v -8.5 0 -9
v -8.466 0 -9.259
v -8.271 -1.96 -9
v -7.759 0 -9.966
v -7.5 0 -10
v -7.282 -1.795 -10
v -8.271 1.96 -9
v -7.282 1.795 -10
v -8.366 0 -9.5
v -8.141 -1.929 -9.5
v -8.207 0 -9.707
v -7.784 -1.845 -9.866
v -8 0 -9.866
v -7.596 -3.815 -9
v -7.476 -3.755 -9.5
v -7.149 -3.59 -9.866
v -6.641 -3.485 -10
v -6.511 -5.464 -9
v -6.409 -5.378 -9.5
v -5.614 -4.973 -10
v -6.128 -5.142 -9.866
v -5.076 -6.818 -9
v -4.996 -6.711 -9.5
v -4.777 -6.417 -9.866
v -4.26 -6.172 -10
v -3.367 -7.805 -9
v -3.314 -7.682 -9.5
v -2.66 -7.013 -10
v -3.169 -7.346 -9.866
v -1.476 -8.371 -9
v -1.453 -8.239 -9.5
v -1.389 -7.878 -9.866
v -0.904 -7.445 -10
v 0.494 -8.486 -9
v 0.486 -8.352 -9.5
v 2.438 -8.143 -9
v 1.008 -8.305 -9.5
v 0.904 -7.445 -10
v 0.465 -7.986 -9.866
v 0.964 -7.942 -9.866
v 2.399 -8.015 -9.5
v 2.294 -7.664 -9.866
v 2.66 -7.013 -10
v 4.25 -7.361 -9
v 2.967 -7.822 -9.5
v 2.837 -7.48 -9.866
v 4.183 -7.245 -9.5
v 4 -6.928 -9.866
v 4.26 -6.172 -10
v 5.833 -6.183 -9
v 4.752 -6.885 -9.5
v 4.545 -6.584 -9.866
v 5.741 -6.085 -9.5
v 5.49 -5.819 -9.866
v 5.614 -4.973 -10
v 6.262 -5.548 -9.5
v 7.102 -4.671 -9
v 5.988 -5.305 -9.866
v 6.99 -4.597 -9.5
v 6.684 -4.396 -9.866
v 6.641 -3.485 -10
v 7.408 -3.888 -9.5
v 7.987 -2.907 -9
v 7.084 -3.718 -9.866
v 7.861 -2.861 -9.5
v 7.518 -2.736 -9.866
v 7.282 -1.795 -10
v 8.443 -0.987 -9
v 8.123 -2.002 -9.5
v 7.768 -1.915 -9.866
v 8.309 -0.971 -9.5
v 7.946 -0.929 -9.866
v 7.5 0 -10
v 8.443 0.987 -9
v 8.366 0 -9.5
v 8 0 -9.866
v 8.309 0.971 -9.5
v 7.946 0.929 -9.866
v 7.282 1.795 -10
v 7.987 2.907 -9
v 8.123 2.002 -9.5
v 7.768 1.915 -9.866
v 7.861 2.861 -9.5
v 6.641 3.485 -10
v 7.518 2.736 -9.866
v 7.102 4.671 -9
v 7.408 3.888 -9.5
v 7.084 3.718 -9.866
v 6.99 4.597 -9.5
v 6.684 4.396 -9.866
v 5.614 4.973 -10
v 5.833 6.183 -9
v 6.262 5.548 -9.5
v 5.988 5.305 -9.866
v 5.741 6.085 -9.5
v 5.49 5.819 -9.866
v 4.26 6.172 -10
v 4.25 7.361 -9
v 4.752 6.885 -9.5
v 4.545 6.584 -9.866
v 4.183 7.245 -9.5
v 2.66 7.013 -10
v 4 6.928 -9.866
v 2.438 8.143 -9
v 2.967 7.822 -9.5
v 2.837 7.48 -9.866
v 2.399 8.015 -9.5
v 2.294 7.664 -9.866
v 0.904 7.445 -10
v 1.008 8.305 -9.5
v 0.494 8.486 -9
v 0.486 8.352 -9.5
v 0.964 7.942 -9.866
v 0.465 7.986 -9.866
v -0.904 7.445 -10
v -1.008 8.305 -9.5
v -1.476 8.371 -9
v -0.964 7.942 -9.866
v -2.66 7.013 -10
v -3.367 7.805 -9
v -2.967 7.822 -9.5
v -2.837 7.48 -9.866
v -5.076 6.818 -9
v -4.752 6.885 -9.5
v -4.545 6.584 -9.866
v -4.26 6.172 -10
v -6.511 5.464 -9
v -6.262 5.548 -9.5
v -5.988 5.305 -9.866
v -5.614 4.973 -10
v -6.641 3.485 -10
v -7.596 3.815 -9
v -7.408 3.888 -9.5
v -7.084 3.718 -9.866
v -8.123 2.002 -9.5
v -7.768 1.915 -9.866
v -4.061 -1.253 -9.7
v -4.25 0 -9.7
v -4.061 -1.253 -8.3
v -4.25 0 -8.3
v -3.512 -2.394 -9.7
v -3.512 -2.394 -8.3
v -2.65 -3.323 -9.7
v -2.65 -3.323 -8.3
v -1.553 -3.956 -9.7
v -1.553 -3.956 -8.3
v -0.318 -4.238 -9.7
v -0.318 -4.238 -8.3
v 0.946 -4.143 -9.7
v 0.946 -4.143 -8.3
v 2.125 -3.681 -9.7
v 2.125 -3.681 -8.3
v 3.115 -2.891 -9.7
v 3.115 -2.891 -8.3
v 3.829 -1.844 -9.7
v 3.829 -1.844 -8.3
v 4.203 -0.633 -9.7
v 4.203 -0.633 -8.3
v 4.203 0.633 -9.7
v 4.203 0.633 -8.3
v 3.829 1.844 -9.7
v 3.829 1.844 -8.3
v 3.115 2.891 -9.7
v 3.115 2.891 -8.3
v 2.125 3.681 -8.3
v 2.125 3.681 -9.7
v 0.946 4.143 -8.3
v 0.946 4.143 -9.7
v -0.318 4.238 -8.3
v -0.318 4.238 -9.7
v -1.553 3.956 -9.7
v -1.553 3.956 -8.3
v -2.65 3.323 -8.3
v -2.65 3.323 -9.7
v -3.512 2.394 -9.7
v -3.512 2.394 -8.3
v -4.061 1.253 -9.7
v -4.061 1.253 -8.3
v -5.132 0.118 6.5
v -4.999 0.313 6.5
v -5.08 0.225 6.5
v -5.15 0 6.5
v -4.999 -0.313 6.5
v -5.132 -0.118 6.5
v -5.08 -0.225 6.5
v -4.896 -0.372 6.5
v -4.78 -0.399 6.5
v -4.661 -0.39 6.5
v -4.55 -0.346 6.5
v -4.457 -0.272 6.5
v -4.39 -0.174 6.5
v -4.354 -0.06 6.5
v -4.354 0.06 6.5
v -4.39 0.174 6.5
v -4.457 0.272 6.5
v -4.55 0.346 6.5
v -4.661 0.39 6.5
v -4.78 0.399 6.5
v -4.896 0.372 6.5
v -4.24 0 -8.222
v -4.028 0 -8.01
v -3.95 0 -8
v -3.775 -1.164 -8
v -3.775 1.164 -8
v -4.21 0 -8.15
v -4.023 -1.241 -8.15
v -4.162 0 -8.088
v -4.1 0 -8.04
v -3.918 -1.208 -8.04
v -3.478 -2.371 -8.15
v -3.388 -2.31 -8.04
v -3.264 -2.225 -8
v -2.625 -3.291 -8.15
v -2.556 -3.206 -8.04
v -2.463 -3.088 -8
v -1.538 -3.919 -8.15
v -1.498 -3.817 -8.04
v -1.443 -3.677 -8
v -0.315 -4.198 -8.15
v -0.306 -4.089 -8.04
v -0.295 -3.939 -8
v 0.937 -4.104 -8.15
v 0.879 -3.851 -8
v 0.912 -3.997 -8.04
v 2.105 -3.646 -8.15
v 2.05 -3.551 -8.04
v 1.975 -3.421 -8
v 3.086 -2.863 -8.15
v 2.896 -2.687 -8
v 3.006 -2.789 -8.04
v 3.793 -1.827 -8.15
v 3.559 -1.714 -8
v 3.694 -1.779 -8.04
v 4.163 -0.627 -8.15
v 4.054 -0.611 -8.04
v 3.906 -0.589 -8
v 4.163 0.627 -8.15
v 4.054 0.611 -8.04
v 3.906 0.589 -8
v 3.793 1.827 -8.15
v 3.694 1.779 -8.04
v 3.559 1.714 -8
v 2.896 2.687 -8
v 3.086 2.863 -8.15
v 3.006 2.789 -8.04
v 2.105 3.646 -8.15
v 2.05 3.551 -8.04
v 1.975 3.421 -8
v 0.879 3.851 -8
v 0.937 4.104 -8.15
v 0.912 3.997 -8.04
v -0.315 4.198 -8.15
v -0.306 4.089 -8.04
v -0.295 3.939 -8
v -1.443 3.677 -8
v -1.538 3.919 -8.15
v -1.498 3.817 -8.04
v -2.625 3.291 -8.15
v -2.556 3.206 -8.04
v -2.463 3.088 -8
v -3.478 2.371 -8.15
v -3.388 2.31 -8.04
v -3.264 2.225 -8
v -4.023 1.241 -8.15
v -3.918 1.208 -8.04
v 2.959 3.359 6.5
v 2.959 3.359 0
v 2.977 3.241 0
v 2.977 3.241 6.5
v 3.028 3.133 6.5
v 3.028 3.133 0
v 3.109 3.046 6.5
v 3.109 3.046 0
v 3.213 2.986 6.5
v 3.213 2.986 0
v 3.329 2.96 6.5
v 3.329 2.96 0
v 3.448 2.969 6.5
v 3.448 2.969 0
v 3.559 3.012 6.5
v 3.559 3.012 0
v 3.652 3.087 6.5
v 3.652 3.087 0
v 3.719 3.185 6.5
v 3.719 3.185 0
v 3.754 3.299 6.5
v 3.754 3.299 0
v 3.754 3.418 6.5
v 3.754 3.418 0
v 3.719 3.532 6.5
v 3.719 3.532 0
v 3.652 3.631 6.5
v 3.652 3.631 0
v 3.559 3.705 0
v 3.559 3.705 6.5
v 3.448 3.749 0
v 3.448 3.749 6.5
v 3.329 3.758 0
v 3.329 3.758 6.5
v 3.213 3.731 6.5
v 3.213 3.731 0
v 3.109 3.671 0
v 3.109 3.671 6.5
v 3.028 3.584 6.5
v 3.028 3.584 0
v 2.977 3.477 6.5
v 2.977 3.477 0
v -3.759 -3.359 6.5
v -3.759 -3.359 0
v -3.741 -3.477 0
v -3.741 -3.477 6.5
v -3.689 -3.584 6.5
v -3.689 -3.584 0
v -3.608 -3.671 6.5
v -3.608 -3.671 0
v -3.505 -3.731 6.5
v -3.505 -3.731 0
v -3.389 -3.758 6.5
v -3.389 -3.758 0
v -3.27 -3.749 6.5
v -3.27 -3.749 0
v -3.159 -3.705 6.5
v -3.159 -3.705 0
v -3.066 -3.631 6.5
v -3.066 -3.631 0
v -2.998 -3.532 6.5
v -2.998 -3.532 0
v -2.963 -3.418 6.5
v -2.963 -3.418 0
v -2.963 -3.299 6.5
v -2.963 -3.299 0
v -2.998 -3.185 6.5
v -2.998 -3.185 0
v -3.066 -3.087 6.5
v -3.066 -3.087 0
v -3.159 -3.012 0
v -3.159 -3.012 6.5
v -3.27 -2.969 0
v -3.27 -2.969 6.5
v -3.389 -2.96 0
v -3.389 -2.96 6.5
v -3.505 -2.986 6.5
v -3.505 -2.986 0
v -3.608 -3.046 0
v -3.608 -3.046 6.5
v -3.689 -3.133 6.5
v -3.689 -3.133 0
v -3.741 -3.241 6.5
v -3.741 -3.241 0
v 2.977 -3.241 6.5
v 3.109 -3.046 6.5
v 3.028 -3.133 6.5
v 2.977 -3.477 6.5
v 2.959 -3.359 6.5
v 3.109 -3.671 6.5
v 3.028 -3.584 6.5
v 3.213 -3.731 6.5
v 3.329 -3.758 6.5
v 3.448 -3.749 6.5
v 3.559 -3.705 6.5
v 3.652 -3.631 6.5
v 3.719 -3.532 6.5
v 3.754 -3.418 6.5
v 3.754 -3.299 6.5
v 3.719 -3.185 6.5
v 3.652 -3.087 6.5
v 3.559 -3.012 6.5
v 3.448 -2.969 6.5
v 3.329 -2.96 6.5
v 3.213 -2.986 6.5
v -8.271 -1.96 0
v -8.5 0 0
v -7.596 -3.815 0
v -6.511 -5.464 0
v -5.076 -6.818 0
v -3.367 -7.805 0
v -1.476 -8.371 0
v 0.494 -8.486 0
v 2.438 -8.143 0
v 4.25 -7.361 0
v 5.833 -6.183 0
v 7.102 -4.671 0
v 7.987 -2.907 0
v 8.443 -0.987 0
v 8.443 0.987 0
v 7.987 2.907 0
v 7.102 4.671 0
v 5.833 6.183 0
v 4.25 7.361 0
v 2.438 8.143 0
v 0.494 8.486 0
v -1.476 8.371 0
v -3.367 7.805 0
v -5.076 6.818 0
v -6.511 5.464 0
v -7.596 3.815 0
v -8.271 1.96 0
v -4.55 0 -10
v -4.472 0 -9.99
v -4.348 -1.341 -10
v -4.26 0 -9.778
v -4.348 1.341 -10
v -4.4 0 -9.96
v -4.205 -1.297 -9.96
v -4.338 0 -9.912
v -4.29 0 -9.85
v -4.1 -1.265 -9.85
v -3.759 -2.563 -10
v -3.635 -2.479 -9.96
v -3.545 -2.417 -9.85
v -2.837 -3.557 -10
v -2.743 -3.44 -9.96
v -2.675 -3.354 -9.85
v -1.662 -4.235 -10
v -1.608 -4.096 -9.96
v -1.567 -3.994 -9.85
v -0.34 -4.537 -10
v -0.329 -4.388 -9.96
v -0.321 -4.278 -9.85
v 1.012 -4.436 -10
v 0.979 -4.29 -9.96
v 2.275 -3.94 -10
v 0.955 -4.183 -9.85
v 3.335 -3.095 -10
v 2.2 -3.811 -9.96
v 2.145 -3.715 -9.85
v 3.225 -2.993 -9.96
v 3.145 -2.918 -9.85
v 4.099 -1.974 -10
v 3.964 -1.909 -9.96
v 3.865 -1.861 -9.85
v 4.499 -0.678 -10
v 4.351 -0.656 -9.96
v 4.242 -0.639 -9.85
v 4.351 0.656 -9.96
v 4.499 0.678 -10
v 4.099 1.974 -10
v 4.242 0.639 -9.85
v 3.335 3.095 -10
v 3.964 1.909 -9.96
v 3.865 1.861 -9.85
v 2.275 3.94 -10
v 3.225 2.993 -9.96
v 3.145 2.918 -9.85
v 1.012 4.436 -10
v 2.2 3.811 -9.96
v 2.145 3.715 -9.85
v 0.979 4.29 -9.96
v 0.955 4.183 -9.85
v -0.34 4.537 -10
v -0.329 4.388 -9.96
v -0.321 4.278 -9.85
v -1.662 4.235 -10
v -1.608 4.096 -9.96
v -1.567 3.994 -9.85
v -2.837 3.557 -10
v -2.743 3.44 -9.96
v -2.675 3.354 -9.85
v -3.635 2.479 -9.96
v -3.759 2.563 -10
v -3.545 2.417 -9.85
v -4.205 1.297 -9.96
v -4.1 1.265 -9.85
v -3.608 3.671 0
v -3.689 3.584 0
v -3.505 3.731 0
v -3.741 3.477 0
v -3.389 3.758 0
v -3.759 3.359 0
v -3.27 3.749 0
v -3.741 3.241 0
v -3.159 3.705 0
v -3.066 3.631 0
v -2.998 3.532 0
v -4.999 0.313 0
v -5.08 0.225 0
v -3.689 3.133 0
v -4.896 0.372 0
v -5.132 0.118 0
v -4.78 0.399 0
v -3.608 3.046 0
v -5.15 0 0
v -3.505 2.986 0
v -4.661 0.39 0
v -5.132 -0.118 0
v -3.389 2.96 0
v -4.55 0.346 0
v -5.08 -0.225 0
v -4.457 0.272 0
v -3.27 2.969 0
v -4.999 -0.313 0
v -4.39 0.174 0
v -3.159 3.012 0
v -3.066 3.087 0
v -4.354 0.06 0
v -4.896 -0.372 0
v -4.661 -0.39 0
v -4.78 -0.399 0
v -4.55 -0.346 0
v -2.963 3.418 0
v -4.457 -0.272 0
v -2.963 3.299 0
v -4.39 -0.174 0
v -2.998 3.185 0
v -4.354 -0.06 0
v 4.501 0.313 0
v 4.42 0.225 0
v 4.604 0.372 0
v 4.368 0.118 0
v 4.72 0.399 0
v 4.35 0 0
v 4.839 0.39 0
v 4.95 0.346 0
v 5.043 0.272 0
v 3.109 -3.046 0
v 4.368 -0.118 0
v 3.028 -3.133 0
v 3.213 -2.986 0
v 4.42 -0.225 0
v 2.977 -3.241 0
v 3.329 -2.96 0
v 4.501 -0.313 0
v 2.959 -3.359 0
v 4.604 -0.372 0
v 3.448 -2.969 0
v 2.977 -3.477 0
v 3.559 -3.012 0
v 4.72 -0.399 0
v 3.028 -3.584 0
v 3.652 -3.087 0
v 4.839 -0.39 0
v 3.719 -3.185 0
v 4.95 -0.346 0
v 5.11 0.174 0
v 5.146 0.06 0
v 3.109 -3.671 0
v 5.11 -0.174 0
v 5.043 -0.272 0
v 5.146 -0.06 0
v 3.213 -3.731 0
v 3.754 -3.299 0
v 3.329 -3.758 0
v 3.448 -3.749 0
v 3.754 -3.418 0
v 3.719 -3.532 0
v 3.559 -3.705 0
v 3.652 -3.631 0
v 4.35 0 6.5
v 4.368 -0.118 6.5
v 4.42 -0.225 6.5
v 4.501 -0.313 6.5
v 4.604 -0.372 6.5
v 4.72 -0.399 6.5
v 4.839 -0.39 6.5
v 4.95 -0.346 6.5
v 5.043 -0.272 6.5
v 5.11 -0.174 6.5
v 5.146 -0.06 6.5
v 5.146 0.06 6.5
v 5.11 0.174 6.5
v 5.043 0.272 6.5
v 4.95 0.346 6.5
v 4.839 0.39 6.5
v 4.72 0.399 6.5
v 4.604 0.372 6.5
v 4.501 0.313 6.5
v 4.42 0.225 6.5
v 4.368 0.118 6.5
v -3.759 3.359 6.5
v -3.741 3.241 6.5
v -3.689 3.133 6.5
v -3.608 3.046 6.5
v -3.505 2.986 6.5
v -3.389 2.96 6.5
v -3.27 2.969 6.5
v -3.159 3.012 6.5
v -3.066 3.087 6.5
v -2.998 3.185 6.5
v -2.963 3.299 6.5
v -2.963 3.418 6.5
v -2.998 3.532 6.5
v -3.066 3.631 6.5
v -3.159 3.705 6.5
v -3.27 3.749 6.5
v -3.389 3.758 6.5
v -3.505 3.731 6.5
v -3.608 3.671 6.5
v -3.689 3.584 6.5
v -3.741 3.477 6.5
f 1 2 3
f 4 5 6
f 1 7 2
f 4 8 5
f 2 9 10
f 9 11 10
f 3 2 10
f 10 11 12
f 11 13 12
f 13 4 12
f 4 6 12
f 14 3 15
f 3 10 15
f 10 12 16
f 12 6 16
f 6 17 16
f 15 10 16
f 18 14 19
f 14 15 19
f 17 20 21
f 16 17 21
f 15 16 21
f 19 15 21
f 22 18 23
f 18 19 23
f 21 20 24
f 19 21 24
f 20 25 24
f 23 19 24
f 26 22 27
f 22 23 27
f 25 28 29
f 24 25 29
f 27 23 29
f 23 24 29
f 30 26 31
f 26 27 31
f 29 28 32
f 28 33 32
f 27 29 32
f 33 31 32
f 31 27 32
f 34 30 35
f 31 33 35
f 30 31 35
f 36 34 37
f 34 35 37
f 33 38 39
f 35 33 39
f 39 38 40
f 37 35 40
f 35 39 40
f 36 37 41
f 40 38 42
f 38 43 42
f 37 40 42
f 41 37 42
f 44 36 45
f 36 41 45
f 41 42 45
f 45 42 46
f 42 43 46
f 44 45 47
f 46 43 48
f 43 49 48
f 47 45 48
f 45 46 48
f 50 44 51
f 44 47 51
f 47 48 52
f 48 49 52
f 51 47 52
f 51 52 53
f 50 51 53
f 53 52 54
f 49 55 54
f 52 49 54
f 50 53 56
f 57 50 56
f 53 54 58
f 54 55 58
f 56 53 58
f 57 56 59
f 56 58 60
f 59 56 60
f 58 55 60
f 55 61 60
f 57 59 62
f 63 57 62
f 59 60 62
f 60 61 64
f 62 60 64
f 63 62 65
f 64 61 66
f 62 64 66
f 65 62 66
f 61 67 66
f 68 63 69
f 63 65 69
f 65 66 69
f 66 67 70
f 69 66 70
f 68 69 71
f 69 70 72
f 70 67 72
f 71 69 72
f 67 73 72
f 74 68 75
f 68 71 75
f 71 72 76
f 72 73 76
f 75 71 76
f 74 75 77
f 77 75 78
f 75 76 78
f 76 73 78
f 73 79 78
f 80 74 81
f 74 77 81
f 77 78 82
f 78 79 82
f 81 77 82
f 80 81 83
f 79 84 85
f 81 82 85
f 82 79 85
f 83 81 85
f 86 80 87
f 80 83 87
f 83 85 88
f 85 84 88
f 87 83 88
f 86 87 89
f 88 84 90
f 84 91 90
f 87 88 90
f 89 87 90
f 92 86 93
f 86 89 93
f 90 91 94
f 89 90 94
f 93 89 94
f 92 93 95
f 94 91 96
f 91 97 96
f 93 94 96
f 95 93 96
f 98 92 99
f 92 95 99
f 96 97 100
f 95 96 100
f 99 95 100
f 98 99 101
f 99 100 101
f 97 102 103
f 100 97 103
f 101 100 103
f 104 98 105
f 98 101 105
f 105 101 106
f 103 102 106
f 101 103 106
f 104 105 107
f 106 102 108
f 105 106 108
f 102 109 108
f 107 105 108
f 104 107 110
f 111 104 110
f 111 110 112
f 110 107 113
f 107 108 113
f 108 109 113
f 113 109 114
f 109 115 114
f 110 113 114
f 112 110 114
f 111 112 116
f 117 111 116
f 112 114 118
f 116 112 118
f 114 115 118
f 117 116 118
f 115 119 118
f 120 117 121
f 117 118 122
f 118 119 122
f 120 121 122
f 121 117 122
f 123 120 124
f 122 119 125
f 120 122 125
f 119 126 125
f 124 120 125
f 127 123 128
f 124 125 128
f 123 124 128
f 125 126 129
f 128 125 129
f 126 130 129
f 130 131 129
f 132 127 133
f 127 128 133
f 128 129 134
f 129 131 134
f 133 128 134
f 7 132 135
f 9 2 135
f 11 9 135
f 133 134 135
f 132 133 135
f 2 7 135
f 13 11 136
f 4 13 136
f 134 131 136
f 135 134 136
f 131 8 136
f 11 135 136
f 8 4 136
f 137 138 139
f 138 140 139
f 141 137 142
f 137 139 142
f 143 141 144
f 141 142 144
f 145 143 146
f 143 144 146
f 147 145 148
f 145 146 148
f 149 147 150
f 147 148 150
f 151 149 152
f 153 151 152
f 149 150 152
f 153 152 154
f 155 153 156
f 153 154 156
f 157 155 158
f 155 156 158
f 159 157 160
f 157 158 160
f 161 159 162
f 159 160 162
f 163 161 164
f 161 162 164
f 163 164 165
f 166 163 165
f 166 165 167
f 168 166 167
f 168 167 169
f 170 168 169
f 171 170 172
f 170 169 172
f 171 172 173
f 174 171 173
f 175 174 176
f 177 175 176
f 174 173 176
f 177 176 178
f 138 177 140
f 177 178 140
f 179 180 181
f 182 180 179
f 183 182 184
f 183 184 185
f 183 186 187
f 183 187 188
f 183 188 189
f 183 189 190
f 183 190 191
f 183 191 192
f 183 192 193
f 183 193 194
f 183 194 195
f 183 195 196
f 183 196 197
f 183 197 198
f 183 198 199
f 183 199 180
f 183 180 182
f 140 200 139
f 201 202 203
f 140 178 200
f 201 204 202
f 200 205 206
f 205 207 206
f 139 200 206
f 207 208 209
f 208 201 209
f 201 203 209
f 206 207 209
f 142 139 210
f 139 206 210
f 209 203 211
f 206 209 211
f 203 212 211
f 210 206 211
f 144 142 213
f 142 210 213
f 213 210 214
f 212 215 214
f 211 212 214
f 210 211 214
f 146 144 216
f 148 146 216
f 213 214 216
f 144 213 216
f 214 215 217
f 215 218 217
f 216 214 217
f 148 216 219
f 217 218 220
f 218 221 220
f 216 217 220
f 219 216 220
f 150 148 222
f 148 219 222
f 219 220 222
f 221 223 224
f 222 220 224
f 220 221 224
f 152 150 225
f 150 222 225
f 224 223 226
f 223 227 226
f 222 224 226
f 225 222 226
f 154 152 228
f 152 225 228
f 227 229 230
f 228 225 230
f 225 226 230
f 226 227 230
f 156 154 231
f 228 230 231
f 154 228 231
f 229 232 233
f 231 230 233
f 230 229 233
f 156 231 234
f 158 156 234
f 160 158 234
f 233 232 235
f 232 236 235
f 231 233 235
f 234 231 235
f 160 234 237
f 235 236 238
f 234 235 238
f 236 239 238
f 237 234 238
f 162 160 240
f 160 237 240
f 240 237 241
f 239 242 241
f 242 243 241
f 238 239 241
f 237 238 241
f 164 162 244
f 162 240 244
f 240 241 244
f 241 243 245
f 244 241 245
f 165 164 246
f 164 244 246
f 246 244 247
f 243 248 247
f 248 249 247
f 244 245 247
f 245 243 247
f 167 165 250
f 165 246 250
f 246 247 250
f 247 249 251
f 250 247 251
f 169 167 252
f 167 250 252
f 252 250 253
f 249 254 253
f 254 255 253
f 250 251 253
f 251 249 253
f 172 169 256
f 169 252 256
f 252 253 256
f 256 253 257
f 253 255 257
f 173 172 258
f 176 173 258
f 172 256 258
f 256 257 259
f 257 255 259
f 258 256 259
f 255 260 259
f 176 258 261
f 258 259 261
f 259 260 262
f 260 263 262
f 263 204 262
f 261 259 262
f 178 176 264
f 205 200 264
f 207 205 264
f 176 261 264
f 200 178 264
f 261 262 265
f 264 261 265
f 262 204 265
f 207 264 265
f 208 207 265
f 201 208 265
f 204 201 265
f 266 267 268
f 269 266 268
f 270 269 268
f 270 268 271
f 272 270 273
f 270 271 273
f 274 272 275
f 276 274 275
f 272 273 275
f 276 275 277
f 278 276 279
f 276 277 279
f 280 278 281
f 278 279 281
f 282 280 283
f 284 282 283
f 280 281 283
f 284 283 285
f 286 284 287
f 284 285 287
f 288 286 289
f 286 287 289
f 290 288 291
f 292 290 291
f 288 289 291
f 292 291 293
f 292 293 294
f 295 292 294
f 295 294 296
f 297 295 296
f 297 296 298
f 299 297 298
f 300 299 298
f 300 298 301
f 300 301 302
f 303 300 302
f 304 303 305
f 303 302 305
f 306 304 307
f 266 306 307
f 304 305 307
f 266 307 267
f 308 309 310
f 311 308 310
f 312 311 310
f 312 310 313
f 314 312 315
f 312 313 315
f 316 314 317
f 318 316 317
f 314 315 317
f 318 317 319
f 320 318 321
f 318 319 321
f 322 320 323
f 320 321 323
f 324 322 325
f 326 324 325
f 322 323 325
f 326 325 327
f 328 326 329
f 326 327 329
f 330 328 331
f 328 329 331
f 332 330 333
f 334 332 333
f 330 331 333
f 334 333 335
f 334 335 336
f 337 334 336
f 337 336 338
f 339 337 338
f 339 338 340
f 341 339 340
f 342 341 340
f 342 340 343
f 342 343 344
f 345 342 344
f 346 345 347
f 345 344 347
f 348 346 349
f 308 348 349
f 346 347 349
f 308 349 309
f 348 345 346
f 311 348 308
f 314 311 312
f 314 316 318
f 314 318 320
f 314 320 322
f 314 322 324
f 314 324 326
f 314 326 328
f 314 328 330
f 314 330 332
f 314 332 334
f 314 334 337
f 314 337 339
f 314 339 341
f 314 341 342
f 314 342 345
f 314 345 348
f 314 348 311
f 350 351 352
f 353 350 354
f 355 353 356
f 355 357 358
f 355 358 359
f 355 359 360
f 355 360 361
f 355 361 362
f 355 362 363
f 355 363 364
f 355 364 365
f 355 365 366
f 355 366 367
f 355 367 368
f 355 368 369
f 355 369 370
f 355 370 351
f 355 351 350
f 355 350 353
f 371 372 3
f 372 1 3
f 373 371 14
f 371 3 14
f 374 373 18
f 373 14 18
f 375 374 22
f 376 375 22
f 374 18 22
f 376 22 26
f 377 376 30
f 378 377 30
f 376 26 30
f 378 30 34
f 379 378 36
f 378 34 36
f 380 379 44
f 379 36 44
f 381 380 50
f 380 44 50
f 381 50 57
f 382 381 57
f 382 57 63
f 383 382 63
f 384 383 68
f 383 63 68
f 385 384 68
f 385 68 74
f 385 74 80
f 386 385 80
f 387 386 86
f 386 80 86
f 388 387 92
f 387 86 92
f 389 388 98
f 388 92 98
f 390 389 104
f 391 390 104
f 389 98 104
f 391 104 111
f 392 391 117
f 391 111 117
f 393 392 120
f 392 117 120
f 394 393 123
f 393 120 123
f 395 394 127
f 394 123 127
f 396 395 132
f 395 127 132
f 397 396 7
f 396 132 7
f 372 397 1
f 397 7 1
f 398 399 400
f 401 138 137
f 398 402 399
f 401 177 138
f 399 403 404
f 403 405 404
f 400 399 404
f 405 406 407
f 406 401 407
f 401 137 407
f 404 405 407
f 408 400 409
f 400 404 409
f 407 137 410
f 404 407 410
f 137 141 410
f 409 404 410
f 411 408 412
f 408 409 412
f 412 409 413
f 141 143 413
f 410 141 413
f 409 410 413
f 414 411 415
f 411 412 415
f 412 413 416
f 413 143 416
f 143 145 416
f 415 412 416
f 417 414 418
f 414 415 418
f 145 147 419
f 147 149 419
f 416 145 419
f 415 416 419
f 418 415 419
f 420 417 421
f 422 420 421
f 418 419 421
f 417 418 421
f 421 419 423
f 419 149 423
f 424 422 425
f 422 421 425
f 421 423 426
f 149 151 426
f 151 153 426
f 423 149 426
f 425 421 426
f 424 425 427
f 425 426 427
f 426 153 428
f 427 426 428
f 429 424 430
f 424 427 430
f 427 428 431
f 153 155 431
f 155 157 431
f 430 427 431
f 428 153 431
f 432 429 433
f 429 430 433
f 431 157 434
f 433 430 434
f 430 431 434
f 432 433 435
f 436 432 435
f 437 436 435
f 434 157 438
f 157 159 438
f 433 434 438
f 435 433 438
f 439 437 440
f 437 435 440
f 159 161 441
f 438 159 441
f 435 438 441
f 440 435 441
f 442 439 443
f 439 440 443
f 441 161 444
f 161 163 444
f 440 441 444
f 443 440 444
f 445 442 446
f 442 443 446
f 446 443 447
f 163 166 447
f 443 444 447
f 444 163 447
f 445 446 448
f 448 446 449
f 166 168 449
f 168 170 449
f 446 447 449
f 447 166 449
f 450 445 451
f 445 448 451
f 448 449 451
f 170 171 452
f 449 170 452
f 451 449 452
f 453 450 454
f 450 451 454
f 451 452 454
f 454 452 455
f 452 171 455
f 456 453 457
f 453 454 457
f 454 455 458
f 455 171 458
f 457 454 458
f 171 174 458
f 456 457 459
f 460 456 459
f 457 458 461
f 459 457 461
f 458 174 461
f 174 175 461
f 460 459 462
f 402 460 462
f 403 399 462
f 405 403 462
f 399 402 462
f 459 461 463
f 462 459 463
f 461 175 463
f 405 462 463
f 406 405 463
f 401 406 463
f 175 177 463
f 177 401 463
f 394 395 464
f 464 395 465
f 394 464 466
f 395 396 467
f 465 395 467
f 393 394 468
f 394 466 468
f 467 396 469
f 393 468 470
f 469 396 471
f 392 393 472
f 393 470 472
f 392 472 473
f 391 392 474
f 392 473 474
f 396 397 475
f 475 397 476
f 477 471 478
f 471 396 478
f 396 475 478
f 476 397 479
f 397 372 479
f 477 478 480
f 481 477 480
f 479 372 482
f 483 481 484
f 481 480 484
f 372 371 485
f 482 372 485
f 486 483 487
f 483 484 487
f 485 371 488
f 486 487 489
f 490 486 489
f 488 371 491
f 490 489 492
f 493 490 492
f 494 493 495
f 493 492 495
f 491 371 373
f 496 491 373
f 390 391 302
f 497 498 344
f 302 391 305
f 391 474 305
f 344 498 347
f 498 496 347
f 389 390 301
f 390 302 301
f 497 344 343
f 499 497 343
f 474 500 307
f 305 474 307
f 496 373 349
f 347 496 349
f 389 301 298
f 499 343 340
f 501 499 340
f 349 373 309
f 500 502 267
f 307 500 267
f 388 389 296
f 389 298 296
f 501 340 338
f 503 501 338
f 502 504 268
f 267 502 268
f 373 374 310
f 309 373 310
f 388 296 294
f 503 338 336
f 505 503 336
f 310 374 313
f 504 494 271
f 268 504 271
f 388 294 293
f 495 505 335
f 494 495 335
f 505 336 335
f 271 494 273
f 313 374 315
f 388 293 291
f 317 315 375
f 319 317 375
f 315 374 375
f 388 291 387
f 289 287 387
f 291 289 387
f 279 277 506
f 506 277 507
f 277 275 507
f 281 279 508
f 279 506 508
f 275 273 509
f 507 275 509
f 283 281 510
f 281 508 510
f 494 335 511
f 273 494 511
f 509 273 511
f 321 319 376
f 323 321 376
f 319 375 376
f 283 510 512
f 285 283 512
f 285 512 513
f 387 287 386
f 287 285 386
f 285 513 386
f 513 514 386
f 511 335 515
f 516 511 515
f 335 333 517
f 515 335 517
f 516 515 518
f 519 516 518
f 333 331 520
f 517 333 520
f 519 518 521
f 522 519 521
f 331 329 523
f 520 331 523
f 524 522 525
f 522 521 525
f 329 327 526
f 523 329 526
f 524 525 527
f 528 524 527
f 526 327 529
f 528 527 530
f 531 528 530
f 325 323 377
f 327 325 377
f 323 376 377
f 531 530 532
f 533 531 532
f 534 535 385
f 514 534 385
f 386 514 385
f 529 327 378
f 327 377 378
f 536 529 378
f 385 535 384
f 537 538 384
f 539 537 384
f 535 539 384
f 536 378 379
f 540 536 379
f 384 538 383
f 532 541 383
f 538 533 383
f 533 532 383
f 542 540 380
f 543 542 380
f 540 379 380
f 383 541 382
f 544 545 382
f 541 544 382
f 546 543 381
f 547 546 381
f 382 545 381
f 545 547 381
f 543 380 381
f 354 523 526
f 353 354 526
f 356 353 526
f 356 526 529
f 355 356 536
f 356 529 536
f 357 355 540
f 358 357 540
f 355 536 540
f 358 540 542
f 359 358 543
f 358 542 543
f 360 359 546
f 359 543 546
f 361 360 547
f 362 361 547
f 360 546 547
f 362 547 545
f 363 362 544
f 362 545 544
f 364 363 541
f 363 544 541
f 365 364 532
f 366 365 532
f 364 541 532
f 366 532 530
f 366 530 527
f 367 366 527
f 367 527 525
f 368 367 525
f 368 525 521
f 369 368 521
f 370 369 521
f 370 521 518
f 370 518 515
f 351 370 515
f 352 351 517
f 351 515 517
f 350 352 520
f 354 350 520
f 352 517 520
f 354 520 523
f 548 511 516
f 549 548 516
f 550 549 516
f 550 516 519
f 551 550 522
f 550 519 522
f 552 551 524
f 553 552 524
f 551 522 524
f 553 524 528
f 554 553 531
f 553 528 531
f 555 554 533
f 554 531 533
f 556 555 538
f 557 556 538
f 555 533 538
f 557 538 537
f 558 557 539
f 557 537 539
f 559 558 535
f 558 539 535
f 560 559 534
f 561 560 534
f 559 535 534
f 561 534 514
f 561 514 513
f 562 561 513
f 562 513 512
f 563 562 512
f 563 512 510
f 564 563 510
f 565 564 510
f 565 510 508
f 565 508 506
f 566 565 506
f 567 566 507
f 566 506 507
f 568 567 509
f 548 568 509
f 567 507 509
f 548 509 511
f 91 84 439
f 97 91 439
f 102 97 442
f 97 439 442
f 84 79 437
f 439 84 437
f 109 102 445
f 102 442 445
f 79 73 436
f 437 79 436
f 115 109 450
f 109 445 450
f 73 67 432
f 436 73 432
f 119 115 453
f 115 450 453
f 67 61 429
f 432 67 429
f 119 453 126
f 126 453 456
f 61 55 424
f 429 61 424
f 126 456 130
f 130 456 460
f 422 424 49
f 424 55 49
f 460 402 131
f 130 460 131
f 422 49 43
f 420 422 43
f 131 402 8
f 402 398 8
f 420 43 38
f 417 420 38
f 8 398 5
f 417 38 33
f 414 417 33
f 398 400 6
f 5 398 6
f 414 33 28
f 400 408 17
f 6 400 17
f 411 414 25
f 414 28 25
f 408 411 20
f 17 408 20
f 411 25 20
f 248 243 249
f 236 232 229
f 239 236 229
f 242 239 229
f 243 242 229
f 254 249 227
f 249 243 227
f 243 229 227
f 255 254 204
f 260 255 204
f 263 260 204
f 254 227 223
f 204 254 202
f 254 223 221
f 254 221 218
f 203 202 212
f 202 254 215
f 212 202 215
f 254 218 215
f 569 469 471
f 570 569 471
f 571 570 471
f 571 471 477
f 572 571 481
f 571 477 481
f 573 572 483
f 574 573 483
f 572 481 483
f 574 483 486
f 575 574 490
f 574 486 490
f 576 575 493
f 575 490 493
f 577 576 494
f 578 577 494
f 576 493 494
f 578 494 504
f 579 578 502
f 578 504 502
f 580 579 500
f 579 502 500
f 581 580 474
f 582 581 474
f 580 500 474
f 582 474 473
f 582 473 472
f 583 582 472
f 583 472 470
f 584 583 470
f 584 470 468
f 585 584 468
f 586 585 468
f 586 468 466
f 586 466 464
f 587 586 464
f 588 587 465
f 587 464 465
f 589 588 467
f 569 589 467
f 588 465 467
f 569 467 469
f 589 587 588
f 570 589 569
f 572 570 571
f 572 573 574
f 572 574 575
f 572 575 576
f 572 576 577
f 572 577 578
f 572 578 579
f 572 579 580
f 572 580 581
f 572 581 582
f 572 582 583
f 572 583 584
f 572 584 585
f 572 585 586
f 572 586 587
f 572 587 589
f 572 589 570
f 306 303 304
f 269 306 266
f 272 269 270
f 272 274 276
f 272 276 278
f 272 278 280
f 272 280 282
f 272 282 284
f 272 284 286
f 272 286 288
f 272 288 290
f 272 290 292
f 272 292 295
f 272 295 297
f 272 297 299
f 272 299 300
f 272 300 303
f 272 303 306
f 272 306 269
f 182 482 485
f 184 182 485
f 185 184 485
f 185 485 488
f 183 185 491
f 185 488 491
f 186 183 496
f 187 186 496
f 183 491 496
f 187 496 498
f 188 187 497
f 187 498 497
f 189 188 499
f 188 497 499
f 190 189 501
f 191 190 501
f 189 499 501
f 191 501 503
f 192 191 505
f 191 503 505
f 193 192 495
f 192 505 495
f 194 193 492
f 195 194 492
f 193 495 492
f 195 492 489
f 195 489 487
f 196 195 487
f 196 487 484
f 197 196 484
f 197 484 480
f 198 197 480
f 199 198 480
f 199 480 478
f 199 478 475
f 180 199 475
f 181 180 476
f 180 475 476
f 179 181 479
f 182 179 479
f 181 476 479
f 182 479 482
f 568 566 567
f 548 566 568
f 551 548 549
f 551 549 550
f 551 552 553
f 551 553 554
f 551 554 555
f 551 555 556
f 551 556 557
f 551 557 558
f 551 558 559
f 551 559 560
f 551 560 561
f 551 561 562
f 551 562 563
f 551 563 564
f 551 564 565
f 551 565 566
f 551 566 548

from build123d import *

# Parameters (mm, degrees)
SKETCH_2_R      = 0.4
EXTRUDE_1_DEPTH = 6.5


with BuildPart() as part:
    # 草图1 → 旋转1 (revolve)
    with BuildSketch(Plane(origin=(0, 0, 0), x_dir=(1, 0, 0), z_dir=(0, 1, 0)), mode=Mode.PRIVATE) as revolve_1_sk:
        with BuildLine():
            Line((0, 8), (0, 0))
            Line((0, 0), (8.5, 0))
            Line((8.5, 0), (8.5, 9))
            ThreePointArc((8.5, 9), (8.207106781, 9.707106781), (7.5, 10))
            Line((7.5, 10), (4.55, 10))
            ThreePointArc((4.55, 10), (4.337867966, 9.912132034), (4.25, 9.7))
            Line((4.25, 9.7), (4.25, 8.3))
            ThreePointArc((4.25, 8.3), (4.162132034, 8.087867966), (3.95, 8))
            Line((3.95, 8), (0, 8))
        make_face()
    revolve(revolve_1_sk.sketch.rotate(Axis((0, 0, -9.831715268), (0, 0, 1)), 180), axis=Axis((0, 0, -9.831715268), (0, 0, 1)))

    # 草图2 → 凸台-拉伸1 (add)
    with BuildSketch(Plane.XY):
        with Locations(Location((-4.75, 0, 0), (0, 0, 180))):
            Circle(SKETCH_2_R)
        with Locations(Location((-3.358757211, 3.358757211, 0), (0, 0, 180))):
            Circle(SKETCH_2_R)
        with Locations(Location((3.358757211, 3.358757211, 0), (0, 0, 180))):
            Circle(SKETCH_2_R)
        with Locations(Location((4.75, 0, 0), (0, 0, 180))):
            Circle(SKETCH_2_R)
        with Locations(Location((3.358757211, -3.358757211, 0), (0, 0, 180))):
            Circle(SKETCH_2_R)
        with Locations(Location((-3.358757211, -3.358757211, 0), (0, 0, 180))):
            Circle(SKETCH_2_R)
    extrude(amount=EXTRUDE_1_DEPTH)


solid = part.part
